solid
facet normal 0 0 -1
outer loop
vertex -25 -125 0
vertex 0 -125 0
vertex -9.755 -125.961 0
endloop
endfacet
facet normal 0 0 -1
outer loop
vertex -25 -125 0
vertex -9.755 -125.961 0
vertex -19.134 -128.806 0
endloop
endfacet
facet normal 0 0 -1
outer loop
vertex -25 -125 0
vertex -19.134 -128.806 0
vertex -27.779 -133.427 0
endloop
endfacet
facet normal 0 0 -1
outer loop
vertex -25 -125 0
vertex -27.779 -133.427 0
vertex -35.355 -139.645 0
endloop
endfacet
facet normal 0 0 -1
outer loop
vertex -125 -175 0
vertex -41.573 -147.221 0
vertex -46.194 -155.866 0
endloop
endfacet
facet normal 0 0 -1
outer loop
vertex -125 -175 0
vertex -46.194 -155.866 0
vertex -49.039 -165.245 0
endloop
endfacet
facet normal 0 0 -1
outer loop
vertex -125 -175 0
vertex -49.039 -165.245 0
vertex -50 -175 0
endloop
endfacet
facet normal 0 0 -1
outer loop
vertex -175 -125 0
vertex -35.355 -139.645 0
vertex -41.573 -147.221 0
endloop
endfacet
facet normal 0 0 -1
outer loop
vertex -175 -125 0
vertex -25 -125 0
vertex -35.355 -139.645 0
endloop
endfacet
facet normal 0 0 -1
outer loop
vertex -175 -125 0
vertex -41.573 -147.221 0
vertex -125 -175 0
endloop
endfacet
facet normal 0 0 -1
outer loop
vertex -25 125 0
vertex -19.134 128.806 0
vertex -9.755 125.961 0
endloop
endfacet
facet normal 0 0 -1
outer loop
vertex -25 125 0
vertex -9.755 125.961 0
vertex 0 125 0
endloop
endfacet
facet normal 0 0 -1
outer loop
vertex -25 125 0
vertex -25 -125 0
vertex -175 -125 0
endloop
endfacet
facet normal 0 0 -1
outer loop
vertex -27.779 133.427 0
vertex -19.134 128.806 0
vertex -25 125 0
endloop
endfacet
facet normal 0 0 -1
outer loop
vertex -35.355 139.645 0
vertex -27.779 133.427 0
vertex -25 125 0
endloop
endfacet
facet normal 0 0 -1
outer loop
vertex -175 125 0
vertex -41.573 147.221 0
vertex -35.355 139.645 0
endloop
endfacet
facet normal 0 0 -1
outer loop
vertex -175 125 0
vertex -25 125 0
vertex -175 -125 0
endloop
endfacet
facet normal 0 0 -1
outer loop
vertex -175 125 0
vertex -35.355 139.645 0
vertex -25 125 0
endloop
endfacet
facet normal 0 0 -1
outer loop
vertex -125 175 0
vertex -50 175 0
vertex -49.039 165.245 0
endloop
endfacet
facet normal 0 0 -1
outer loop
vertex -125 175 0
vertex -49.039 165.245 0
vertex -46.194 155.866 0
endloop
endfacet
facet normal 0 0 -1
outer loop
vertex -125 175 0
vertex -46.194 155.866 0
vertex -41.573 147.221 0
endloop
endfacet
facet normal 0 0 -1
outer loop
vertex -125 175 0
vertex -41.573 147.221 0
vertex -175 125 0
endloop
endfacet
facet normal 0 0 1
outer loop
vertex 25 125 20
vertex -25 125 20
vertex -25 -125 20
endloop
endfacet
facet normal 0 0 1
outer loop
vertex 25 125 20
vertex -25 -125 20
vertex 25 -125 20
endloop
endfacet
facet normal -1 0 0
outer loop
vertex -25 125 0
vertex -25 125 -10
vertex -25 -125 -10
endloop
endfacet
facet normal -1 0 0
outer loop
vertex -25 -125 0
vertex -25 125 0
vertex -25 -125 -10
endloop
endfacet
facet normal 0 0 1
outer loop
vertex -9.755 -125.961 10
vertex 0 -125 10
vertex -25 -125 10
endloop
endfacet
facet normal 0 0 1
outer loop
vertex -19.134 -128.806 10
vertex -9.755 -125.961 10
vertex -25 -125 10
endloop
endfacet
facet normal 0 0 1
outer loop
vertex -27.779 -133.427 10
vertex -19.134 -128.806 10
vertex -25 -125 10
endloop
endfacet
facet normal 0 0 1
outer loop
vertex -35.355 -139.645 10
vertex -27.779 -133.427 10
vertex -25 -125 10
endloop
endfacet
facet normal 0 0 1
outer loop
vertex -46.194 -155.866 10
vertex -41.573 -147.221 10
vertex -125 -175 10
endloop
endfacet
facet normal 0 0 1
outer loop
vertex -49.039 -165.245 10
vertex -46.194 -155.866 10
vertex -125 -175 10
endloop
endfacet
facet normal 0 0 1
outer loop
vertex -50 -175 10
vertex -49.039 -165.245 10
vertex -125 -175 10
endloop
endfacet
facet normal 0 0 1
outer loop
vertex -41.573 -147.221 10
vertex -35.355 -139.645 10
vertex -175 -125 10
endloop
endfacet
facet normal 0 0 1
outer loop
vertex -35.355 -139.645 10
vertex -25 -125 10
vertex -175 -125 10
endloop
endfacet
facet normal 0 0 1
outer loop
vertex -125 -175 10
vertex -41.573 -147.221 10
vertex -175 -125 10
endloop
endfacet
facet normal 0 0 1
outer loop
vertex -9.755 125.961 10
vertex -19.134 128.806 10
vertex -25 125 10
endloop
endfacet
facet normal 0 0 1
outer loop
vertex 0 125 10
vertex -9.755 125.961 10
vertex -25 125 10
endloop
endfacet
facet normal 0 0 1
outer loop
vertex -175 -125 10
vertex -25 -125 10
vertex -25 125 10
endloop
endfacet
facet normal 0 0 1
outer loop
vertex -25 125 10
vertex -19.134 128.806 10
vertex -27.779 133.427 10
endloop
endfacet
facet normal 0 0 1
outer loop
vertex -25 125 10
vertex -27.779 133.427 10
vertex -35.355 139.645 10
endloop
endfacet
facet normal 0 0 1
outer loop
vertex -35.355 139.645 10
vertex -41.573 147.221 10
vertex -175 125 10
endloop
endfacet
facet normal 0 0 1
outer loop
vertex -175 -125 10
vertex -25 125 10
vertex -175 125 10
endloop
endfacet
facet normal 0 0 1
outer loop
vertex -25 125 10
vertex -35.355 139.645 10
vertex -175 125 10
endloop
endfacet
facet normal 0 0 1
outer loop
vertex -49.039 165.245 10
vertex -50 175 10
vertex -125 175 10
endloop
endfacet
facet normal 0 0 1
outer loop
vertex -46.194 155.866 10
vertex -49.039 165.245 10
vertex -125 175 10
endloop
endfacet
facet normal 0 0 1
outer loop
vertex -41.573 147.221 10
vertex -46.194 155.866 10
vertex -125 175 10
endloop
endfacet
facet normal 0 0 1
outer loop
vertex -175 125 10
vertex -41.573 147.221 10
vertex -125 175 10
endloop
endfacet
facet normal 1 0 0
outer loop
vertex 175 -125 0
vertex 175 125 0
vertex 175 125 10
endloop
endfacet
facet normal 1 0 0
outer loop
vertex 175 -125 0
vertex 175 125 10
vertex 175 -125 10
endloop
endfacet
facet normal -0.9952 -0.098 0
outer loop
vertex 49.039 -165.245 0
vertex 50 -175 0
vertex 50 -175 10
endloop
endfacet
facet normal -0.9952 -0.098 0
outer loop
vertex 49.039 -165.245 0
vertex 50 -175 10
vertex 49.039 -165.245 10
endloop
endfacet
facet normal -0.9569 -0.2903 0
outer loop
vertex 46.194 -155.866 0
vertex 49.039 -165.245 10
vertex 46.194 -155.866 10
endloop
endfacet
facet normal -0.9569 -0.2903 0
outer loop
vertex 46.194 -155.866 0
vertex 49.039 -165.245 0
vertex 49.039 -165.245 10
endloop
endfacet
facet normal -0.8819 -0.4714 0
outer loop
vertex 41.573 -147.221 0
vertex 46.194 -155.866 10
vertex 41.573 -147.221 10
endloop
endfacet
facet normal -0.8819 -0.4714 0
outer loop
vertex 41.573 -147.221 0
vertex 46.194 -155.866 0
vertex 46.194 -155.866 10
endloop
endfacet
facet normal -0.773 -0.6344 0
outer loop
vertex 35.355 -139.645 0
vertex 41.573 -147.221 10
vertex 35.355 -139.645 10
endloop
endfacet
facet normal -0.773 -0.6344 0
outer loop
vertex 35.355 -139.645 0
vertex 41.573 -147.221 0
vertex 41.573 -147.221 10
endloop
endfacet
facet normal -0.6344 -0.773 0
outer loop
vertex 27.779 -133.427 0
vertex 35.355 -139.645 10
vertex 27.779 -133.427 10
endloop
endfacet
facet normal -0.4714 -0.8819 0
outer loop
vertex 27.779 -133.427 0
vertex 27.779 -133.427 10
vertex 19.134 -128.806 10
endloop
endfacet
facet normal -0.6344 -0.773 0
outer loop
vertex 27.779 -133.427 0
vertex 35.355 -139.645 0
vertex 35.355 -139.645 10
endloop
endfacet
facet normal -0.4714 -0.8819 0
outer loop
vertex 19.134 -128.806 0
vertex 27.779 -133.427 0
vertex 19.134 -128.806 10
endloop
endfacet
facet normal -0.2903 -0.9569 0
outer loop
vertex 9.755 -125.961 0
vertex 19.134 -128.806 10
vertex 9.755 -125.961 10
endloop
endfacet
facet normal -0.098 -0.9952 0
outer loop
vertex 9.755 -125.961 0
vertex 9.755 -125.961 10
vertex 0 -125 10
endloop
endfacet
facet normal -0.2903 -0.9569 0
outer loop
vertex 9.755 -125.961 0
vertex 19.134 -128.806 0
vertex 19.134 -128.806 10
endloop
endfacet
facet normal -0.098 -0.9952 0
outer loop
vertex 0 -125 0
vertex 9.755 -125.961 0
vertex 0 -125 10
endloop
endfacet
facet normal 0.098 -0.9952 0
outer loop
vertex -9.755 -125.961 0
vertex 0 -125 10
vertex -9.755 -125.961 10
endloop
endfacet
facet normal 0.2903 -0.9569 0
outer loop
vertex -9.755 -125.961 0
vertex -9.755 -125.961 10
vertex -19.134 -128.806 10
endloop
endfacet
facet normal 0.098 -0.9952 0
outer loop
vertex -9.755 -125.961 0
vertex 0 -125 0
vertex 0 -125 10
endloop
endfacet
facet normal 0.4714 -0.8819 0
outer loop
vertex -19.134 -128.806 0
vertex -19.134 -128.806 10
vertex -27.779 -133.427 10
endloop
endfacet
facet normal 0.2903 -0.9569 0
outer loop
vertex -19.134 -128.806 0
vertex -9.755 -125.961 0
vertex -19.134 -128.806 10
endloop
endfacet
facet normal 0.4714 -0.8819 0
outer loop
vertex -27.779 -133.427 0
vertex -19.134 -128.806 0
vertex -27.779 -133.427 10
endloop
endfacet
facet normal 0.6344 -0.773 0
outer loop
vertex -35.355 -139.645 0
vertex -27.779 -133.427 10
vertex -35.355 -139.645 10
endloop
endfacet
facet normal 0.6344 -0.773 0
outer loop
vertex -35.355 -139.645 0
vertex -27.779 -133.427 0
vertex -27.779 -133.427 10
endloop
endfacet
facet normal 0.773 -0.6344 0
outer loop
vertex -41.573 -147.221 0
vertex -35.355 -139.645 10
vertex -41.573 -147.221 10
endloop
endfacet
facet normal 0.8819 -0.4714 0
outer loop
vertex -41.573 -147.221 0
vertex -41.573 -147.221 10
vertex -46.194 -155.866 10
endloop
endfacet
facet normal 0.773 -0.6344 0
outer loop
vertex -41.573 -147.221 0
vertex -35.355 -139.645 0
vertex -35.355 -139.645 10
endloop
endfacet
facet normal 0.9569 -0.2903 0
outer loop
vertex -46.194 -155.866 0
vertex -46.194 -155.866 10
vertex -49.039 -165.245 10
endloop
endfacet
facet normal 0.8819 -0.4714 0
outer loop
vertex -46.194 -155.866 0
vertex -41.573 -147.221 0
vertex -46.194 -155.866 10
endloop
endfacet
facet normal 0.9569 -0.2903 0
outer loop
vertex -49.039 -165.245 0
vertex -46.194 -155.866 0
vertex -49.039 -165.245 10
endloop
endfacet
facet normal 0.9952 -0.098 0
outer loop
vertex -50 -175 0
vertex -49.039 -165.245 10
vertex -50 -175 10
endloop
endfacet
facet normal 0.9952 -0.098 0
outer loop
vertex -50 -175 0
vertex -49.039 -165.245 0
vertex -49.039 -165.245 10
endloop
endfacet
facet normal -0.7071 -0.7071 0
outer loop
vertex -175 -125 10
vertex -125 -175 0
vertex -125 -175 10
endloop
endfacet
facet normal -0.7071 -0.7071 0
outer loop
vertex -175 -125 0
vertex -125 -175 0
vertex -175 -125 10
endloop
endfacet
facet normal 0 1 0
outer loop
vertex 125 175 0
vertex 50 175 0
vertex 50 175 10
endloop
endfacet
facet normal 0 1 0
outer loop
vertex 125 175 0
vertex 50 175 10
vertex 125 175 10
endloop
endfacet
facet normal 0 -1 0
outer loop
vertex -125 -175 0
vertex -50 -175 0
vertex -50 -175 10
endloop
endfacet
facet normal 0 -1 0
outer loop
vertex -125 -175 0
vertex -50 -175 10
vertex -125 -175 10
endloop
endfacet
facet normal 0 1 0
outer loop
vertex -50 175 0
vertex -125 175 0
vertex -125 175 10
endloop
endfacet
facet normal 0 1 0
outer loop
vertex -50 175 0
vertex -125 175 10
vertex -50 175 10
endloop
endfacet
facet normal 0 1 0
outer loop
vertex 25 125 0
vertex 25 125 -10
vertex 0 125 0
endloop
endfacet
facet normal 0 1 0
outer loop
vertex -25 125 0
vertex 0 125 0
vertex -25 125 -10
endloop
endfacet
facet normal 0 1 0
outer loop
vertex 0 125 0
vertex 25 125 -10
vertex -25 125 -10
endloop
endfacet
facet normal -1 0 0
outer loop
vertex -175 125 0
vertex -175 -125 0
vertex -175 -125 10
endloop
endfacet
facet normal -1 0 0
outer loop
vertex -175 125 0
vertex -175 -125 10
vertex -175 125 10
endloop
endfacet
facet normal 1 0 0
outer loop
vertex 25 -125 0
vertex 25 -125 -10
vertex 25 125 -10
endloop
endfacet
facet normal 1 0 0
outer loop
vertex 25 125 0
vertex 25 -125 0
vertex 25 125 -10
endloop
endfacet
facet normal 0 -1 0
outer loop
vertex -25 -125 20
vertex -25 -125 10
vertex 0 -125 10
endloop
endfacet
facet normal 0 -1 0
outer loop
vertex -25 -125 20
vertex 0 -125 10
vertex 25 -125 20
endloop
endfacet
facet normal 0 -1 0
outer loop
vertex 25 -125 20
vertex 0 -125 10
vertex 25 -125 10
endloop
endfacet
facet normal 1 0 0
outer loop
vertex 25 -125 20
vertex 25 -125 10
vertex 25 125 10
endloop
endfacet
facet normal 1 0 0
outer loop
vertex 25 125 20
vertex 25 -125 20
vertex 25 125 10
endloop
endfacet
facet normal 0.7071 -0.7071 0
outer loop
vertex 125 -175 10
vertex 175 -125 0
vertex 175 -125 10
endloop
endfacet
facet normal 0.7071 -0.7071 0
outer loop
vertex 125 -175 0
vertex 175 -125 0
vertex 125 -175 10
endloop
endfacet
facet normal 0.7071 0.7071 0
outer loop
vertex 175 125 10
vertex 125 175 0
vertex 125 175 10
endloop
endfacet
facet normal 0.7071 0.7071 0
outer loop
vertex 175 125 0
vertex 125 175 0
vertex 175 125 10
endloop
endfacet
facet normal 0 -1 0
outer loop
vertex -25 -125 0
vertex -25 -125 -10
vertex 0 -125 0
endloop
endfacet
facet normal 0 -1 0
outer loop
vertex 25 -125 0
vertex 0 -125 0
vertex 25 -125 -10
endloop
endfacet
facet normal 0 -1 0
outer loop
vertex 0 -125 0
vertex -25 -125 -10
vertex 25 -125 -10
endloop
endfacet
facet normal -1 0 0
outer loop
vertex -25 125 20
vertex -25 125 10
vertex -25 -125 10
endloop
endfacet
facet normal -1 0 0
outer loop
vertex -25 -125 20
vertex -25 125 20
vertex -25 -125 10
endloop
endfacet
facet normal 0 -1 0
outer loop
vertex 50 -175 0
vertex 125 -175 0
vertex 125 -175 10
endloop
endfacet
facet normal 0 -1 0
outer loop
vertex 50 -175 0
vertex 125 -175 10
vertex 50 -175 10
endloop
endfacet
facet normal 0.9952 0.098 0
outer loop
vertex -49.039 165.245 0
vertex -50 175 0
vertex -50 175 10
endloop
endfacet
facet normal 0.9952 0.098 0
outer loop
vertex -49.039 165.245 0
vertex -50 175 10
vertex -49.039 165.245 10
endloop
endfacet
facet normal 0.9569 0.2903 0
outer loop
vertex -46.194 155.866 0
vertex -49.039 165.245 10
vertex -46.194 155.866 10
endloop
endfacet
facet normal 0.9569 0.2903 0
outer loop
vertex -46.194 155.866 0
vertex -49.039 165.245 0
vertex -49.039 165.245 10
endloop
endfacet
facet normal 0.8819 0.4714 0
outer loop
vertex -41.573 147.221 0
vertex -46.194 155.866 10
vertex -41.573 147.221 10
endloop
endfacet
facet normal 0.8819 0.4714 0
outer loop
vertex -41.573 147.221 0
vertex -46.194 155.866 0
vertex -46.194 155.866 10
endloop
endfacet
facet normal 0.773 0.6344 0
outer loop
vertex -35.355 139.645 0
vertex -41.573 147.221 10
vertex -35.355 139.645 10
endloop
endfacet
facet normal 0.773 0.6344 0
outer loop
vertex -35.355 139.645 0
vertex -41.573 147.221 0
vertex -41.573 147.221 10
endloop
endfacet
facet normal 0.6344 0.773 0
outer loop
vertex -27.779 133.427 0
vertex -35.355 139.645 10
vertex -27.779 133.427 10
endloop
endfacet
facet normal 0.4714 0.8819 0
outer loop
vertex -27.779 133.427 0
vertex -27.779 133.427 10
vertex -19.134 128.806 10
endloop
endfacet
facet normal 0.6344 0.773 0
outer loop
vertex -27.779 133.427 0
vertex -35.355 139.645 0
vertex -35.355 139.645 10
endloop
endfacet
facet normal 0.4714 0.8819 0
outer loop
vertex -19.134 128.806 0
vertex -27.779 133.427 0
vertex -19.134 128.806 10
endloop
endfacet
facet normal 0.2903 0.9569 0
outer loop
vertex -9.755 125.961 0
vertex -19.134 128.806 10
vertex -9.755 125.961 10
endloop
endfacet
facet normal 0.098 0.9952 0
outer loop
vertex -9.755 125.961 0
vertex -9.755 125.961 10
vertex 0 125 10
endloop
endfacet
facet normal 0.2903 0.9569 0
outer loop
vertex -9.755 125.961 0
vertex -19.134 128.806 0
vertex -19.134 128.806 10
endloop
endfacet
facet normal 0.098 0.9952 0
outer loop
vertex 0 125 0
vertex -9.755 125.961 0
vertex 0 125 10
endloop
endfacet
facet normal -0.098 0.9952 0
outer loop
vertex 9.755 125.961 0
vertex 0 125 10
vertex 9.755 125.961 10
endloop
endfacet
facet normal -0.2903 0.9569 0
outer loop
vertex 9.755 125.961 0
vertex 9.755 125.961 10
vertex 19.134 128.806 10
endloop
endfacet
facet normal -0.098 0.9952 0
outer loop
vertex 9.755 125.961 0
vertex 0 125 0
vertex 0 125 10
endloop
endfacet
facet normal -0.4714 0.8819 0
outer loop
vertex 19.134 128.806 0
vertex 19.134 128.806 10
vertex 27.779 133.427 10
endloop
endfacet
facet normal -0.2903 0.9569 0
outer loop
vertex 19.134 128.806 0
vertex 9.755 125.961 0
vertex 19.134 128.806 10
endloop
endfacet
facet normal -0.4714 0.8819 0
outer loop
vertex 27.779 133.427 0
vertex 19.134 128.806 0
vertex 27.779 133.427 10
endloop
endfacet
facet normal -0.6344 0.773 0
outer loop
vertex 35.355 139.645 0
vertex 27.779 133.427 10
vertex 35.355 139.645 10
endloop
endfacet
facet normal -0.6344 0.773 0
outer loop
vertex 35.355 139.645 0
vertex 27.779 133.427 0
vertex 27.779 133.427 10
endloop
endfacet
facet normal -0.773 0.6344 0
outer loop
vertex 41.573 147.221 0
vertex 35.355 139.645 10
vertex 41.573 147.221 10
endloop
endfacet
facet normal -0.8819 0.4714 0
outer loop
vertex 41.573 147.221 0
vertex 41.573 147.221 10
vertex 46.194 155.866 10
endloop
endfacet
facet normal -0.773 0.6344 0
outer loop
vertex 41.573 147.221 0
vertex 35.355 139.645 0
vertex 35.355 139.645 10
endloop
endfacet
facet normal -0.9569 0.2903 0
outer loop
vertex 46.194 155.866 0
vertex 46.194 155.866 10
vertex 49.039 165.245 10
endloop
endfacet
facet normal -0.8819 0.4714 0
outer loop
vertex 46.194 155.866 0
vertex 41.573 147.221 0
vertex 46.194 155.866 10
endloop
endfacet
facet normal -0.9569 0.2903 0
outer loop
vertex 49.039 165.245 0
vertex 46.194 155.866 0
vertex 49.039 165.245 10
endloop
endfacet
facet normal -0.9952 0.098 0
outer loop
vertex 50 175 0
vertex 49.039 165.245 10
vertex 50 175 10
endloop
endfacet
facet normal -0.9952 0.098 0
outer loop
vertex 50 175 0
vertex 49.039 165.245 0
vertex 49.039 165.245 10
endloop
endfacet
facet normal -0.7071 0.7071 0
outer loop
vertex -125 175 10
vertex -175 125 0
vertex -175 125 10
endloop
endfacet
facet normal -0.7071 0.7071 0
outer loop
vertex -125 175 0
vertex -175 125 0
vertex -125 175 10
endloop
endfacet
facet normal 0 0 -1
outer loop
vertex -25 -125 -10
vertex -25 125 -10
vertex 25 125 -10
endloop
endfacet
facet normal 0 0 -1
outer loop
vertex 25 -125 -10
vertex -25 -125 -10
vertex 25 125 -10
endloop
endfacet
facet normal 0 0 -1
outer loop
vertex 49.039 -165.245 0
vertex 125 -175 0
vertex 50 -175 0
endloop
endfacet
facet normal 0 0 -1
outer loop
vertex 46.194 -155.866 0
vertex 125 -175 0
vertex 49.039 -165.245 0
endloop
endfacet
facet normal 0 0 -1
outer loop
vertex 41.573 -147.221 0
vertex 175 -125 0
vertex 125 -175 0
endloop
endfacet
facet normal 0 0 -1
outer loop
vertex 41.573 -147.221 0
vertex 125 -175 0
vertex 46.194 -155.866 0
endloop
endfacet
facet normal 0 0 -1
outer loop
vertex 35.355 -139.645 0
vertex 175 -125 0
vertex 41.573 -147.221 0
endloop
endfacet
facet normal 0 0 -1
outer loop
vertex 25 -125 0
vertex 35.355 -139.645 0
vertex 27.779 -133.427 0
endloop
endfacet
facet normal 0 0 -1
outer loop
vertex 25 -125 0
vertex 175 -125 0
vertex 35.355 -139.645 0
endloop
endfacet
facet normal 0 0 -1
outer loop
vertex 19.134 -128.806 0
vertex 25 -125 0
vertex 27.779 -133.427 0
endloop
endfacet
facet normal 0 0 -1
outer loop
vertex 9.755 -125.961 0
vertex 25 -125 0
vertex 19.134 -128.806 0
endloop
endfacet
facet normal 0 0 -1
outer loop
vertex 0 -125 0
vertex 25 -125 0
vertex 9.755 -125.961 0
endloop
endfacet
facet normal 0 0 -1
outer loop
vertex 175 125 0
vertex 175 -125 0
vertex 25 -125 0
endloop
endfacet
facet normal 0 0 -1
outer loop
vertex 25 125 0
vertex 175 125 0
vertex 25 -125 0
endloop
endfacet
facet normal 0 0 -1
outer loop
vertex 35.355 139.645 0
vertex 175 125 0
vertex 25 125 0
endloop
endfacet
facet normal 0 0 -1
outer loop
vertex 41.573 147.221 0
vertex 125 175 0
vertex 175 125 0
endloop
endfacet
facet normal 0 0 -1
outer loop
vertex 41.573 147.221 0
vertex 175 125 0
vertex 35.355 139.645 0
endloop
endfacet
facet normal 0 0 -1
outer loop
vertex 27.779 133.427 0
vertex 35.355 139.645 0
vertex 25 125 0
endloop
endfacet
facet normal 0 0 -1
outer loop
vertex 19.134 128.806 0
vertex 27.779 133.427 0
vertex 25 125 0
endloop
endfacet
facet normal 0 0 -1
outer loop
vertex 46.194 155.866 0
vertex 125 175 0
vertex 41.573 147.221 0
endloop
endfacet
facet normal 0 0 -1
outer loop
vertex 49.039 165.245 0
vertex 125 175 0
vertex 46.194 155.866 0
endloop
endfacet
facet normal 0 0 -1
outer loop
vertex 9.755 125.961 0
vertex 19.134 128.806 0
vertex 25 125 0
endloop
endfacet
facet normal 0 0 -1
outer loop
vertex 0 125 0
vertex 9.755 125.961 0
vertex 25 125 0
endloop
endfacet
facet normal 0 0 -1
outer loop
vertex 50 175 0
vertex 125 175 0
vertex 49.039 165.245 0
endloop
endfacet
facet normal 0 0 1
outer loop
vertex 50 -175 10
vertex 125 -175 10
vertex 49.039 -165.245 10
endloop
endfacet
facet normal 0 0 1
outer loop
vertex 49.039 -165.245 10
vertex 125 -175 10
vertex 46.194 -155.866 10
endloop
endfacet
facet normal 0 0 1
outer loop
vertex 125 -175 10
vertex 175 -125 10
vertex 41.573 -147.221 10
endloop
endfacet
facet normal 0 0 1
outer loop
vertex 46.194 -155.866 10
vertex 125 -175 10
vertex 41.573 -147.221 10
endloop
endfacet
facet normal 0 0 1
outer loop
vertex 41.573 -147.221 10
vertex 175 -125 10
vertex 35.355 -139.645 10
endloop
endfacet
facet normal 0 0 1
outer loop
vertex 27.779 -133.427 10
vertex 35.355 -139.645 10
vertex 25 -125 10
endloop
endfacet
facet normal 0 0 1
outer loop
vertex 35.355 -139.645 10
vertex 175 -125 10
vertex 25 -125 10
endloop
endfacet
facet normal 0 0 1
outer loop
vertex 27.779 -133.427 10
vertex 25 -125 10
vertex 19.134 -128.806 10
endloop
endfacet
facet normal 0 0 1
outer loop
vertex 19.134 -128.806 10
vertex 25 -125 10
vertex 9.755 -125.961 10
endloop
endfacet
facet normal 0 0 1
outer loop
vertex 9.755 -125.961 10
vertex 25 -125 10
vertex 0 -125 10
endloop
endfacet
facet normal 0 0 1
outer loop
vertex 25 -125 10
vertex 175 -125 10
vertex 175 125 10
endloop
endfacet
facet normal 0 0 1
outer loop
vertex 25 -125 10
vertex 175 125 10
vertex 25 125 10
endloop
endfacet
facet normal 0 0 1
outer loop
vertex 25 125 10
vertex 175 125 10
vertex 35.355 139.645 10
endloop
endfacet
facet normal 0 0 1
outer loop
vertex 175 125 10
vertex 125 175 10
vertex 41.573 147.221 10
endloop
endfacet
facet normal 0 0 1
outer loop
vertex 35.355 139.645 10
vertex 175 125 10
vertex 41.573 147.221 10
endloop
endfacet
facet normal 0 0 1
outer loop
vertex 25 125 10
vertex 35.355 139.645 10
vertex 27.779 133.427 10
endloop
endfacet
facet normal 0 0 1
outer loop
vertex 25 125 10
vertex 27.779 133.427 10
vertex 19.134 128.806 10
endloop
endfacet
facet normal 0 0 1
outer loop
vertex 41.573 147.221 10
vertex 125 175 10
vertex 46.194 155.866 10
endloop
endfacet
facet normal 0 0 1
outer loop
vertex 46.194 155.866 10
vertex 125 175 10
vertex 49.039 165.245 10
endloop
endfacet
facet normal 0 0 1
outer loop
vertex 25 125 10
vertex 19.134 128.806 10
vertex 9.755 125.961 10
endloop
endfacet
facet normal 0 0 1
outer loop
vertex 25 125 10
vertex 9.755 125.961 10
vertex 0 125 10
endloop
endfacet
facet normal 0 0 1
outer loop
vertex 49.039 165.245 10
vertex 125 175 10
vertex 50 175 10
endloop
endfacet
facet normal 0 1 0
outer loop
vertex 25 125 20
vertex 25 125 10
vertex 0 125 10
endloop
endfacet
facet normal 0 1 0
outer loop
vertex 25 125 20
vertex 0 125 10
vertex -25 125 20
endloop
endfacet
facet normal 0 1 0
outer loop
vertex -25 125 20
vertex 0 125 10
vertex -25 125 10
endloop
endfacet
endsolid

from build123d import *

# Parameters (mm, degrees)
BOSS_EXTRUDE1_DEPTH      = 10
BOSS_EXTRUDE2_DEPTH      = 10
BOSS_EXTRUDE2_DEPTH_BACK = 20


with BuildPart() as part:
    # Sketch1 → Boss-Extrude1 (new body)
    with BuildSketch(Plane.XY):
        with BuildLine():
            Line((-125, 175), (-50, 175))
            ThreePointArc((-50, 175), (0, 125), (50, 175))
            Line((50, 175), (125, 175))
            Line((125, 175), (175, 125))
            Line((175, 125), (175, -125))
            Line((175, -125), (125, -175))
            Line((125, -175), (50, -175))
            ThreePointArc((50, -175), (0, -125), (-50, -175))
            Line((-50, -175), (-125, -175))
            Line((-125, -175), (-175, -125))
            Line((-175, -125), (-175, 125))
            Line((-175, 125), (-125, 175))
        make_face()
    extrude(amount=BOSS_EXTRUDE1_DEPTH)

    # Sketch2 → Boss-Extrude2 (add, two sides: drawn at the far end of the back side and taken through both)
    with BuildSketch(Plane.XY.offset(10).offset(-BOSS_EXTRUDE2_DEPTH_BACK)):
        Polygon((25, 125), (-2.148886373, 125), (-25, 125), (-25, 0), (-25, -125), (25, -125), align=None)
    extrude(amount=BOSS_EXTRUDE2_DEPTH + BOSS_EXTRUDE2_DEPTH_BACK)


solid = part.part
